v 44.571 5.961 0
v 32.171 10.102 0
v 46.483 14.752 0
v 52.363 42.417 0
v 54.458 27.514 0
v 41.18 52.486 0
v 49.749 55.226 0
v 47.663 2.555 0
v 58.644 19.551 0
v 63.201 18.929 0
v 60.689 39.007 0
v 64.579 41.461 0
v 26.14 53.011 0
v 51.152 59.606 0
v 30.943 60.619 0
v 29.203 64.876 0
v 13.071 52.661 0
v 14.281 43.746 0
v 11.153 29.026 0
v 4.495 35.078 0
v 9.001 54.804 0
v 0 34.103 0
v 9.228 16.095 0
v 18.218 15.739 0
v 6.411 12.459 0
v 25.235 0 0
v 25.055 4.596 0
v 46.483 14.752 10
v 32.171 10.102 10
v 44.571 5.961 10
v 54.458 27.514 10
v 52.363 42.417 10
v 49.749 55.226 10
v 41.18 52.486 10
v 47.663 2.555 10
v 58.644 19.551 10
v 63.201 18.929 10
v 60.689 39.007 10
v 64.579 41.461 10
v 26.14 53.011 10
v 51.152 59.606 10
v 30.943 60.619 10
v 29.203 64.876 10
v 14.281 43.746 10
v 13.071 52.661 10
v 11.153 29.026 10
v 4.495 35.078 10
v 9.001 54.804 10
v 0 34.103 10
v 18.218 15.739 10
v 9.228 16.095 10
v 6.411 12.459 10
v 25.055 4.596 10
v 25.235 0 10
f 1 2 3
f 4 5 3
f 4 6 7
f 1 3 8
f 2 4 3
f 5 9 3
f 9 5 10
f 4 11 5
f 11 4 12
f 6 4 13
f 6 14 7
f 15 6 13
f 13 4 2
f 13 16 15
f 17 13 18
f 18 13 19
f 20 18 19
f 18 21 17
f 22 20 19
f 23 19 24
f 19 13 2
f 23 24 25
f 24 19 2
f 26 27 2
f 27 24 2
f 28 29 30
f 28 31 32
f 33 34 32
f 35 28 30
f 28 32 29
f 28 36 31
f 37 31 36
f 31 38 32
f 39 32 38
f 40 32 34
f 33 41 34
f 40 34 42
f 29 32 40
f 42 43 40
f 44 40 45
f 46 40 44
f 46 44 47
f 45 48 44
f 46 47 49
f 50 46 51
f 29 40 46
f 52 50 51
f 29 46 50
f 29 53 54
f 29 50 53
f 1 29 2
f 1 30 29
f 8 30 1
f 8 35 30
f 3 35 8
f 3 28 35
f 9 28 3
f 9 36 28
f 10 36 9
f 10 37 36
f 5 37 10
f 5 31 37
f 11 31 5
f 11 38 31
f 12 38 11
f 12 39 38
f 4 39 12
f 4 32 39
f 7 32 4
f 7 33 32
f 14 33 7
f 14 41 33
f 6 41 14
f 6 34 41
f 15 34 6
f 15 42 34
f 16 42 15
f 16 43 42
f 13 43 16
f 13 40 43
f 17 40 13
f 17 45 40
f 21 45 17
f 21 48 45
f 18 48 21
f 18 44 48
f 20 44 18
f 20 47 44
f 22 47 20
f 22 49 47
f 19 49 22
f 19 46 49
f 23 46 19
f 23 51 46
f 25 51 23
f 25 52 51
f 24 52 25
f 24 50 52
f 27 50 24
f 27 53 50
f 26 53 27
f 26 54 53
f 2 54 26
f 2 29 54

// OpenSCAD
$fn = 32;

// ----------------------------------------------------------------------
// Fan rotor section: 9 blades, 22 mm hub radius, 11 mm blades
// ----------------------------------------------------------------------

// --- parameters (mm) ---
profile_height = 10;      // extrusion height
profile_points = 27;      // points of the closed outline

profile = [[54.458, 27.514], [60.689, 39.007], [64.579, 41.461], [52.363, 42.417], [49.749, 55.226], [51.152, 59.606], [41.18, 52.486], [30.943, 60.619], [29.203, 64.876], [26.14, 53.011], [13.071, 52.661], [9.001, 54.804], [14.281, 43.746], [4.495, 35.078], [0, 34.103], [11.153, 29.026], [9.228, 16.095], [6.411, 12.459], [18.218, 15.739], [25.055, 4.596], [25.235, 0], [32.171, 10.102], [44.571, 5.961], [47.663, 2.555], [46.483, 14.752], [58.644, 19.551], [63.201, 18.929]];  // single closed polygon, 27 points, counter clockwise

// --- the one profile operation ---
linear_extrude(height = profile_height) polygon(points = profile);
